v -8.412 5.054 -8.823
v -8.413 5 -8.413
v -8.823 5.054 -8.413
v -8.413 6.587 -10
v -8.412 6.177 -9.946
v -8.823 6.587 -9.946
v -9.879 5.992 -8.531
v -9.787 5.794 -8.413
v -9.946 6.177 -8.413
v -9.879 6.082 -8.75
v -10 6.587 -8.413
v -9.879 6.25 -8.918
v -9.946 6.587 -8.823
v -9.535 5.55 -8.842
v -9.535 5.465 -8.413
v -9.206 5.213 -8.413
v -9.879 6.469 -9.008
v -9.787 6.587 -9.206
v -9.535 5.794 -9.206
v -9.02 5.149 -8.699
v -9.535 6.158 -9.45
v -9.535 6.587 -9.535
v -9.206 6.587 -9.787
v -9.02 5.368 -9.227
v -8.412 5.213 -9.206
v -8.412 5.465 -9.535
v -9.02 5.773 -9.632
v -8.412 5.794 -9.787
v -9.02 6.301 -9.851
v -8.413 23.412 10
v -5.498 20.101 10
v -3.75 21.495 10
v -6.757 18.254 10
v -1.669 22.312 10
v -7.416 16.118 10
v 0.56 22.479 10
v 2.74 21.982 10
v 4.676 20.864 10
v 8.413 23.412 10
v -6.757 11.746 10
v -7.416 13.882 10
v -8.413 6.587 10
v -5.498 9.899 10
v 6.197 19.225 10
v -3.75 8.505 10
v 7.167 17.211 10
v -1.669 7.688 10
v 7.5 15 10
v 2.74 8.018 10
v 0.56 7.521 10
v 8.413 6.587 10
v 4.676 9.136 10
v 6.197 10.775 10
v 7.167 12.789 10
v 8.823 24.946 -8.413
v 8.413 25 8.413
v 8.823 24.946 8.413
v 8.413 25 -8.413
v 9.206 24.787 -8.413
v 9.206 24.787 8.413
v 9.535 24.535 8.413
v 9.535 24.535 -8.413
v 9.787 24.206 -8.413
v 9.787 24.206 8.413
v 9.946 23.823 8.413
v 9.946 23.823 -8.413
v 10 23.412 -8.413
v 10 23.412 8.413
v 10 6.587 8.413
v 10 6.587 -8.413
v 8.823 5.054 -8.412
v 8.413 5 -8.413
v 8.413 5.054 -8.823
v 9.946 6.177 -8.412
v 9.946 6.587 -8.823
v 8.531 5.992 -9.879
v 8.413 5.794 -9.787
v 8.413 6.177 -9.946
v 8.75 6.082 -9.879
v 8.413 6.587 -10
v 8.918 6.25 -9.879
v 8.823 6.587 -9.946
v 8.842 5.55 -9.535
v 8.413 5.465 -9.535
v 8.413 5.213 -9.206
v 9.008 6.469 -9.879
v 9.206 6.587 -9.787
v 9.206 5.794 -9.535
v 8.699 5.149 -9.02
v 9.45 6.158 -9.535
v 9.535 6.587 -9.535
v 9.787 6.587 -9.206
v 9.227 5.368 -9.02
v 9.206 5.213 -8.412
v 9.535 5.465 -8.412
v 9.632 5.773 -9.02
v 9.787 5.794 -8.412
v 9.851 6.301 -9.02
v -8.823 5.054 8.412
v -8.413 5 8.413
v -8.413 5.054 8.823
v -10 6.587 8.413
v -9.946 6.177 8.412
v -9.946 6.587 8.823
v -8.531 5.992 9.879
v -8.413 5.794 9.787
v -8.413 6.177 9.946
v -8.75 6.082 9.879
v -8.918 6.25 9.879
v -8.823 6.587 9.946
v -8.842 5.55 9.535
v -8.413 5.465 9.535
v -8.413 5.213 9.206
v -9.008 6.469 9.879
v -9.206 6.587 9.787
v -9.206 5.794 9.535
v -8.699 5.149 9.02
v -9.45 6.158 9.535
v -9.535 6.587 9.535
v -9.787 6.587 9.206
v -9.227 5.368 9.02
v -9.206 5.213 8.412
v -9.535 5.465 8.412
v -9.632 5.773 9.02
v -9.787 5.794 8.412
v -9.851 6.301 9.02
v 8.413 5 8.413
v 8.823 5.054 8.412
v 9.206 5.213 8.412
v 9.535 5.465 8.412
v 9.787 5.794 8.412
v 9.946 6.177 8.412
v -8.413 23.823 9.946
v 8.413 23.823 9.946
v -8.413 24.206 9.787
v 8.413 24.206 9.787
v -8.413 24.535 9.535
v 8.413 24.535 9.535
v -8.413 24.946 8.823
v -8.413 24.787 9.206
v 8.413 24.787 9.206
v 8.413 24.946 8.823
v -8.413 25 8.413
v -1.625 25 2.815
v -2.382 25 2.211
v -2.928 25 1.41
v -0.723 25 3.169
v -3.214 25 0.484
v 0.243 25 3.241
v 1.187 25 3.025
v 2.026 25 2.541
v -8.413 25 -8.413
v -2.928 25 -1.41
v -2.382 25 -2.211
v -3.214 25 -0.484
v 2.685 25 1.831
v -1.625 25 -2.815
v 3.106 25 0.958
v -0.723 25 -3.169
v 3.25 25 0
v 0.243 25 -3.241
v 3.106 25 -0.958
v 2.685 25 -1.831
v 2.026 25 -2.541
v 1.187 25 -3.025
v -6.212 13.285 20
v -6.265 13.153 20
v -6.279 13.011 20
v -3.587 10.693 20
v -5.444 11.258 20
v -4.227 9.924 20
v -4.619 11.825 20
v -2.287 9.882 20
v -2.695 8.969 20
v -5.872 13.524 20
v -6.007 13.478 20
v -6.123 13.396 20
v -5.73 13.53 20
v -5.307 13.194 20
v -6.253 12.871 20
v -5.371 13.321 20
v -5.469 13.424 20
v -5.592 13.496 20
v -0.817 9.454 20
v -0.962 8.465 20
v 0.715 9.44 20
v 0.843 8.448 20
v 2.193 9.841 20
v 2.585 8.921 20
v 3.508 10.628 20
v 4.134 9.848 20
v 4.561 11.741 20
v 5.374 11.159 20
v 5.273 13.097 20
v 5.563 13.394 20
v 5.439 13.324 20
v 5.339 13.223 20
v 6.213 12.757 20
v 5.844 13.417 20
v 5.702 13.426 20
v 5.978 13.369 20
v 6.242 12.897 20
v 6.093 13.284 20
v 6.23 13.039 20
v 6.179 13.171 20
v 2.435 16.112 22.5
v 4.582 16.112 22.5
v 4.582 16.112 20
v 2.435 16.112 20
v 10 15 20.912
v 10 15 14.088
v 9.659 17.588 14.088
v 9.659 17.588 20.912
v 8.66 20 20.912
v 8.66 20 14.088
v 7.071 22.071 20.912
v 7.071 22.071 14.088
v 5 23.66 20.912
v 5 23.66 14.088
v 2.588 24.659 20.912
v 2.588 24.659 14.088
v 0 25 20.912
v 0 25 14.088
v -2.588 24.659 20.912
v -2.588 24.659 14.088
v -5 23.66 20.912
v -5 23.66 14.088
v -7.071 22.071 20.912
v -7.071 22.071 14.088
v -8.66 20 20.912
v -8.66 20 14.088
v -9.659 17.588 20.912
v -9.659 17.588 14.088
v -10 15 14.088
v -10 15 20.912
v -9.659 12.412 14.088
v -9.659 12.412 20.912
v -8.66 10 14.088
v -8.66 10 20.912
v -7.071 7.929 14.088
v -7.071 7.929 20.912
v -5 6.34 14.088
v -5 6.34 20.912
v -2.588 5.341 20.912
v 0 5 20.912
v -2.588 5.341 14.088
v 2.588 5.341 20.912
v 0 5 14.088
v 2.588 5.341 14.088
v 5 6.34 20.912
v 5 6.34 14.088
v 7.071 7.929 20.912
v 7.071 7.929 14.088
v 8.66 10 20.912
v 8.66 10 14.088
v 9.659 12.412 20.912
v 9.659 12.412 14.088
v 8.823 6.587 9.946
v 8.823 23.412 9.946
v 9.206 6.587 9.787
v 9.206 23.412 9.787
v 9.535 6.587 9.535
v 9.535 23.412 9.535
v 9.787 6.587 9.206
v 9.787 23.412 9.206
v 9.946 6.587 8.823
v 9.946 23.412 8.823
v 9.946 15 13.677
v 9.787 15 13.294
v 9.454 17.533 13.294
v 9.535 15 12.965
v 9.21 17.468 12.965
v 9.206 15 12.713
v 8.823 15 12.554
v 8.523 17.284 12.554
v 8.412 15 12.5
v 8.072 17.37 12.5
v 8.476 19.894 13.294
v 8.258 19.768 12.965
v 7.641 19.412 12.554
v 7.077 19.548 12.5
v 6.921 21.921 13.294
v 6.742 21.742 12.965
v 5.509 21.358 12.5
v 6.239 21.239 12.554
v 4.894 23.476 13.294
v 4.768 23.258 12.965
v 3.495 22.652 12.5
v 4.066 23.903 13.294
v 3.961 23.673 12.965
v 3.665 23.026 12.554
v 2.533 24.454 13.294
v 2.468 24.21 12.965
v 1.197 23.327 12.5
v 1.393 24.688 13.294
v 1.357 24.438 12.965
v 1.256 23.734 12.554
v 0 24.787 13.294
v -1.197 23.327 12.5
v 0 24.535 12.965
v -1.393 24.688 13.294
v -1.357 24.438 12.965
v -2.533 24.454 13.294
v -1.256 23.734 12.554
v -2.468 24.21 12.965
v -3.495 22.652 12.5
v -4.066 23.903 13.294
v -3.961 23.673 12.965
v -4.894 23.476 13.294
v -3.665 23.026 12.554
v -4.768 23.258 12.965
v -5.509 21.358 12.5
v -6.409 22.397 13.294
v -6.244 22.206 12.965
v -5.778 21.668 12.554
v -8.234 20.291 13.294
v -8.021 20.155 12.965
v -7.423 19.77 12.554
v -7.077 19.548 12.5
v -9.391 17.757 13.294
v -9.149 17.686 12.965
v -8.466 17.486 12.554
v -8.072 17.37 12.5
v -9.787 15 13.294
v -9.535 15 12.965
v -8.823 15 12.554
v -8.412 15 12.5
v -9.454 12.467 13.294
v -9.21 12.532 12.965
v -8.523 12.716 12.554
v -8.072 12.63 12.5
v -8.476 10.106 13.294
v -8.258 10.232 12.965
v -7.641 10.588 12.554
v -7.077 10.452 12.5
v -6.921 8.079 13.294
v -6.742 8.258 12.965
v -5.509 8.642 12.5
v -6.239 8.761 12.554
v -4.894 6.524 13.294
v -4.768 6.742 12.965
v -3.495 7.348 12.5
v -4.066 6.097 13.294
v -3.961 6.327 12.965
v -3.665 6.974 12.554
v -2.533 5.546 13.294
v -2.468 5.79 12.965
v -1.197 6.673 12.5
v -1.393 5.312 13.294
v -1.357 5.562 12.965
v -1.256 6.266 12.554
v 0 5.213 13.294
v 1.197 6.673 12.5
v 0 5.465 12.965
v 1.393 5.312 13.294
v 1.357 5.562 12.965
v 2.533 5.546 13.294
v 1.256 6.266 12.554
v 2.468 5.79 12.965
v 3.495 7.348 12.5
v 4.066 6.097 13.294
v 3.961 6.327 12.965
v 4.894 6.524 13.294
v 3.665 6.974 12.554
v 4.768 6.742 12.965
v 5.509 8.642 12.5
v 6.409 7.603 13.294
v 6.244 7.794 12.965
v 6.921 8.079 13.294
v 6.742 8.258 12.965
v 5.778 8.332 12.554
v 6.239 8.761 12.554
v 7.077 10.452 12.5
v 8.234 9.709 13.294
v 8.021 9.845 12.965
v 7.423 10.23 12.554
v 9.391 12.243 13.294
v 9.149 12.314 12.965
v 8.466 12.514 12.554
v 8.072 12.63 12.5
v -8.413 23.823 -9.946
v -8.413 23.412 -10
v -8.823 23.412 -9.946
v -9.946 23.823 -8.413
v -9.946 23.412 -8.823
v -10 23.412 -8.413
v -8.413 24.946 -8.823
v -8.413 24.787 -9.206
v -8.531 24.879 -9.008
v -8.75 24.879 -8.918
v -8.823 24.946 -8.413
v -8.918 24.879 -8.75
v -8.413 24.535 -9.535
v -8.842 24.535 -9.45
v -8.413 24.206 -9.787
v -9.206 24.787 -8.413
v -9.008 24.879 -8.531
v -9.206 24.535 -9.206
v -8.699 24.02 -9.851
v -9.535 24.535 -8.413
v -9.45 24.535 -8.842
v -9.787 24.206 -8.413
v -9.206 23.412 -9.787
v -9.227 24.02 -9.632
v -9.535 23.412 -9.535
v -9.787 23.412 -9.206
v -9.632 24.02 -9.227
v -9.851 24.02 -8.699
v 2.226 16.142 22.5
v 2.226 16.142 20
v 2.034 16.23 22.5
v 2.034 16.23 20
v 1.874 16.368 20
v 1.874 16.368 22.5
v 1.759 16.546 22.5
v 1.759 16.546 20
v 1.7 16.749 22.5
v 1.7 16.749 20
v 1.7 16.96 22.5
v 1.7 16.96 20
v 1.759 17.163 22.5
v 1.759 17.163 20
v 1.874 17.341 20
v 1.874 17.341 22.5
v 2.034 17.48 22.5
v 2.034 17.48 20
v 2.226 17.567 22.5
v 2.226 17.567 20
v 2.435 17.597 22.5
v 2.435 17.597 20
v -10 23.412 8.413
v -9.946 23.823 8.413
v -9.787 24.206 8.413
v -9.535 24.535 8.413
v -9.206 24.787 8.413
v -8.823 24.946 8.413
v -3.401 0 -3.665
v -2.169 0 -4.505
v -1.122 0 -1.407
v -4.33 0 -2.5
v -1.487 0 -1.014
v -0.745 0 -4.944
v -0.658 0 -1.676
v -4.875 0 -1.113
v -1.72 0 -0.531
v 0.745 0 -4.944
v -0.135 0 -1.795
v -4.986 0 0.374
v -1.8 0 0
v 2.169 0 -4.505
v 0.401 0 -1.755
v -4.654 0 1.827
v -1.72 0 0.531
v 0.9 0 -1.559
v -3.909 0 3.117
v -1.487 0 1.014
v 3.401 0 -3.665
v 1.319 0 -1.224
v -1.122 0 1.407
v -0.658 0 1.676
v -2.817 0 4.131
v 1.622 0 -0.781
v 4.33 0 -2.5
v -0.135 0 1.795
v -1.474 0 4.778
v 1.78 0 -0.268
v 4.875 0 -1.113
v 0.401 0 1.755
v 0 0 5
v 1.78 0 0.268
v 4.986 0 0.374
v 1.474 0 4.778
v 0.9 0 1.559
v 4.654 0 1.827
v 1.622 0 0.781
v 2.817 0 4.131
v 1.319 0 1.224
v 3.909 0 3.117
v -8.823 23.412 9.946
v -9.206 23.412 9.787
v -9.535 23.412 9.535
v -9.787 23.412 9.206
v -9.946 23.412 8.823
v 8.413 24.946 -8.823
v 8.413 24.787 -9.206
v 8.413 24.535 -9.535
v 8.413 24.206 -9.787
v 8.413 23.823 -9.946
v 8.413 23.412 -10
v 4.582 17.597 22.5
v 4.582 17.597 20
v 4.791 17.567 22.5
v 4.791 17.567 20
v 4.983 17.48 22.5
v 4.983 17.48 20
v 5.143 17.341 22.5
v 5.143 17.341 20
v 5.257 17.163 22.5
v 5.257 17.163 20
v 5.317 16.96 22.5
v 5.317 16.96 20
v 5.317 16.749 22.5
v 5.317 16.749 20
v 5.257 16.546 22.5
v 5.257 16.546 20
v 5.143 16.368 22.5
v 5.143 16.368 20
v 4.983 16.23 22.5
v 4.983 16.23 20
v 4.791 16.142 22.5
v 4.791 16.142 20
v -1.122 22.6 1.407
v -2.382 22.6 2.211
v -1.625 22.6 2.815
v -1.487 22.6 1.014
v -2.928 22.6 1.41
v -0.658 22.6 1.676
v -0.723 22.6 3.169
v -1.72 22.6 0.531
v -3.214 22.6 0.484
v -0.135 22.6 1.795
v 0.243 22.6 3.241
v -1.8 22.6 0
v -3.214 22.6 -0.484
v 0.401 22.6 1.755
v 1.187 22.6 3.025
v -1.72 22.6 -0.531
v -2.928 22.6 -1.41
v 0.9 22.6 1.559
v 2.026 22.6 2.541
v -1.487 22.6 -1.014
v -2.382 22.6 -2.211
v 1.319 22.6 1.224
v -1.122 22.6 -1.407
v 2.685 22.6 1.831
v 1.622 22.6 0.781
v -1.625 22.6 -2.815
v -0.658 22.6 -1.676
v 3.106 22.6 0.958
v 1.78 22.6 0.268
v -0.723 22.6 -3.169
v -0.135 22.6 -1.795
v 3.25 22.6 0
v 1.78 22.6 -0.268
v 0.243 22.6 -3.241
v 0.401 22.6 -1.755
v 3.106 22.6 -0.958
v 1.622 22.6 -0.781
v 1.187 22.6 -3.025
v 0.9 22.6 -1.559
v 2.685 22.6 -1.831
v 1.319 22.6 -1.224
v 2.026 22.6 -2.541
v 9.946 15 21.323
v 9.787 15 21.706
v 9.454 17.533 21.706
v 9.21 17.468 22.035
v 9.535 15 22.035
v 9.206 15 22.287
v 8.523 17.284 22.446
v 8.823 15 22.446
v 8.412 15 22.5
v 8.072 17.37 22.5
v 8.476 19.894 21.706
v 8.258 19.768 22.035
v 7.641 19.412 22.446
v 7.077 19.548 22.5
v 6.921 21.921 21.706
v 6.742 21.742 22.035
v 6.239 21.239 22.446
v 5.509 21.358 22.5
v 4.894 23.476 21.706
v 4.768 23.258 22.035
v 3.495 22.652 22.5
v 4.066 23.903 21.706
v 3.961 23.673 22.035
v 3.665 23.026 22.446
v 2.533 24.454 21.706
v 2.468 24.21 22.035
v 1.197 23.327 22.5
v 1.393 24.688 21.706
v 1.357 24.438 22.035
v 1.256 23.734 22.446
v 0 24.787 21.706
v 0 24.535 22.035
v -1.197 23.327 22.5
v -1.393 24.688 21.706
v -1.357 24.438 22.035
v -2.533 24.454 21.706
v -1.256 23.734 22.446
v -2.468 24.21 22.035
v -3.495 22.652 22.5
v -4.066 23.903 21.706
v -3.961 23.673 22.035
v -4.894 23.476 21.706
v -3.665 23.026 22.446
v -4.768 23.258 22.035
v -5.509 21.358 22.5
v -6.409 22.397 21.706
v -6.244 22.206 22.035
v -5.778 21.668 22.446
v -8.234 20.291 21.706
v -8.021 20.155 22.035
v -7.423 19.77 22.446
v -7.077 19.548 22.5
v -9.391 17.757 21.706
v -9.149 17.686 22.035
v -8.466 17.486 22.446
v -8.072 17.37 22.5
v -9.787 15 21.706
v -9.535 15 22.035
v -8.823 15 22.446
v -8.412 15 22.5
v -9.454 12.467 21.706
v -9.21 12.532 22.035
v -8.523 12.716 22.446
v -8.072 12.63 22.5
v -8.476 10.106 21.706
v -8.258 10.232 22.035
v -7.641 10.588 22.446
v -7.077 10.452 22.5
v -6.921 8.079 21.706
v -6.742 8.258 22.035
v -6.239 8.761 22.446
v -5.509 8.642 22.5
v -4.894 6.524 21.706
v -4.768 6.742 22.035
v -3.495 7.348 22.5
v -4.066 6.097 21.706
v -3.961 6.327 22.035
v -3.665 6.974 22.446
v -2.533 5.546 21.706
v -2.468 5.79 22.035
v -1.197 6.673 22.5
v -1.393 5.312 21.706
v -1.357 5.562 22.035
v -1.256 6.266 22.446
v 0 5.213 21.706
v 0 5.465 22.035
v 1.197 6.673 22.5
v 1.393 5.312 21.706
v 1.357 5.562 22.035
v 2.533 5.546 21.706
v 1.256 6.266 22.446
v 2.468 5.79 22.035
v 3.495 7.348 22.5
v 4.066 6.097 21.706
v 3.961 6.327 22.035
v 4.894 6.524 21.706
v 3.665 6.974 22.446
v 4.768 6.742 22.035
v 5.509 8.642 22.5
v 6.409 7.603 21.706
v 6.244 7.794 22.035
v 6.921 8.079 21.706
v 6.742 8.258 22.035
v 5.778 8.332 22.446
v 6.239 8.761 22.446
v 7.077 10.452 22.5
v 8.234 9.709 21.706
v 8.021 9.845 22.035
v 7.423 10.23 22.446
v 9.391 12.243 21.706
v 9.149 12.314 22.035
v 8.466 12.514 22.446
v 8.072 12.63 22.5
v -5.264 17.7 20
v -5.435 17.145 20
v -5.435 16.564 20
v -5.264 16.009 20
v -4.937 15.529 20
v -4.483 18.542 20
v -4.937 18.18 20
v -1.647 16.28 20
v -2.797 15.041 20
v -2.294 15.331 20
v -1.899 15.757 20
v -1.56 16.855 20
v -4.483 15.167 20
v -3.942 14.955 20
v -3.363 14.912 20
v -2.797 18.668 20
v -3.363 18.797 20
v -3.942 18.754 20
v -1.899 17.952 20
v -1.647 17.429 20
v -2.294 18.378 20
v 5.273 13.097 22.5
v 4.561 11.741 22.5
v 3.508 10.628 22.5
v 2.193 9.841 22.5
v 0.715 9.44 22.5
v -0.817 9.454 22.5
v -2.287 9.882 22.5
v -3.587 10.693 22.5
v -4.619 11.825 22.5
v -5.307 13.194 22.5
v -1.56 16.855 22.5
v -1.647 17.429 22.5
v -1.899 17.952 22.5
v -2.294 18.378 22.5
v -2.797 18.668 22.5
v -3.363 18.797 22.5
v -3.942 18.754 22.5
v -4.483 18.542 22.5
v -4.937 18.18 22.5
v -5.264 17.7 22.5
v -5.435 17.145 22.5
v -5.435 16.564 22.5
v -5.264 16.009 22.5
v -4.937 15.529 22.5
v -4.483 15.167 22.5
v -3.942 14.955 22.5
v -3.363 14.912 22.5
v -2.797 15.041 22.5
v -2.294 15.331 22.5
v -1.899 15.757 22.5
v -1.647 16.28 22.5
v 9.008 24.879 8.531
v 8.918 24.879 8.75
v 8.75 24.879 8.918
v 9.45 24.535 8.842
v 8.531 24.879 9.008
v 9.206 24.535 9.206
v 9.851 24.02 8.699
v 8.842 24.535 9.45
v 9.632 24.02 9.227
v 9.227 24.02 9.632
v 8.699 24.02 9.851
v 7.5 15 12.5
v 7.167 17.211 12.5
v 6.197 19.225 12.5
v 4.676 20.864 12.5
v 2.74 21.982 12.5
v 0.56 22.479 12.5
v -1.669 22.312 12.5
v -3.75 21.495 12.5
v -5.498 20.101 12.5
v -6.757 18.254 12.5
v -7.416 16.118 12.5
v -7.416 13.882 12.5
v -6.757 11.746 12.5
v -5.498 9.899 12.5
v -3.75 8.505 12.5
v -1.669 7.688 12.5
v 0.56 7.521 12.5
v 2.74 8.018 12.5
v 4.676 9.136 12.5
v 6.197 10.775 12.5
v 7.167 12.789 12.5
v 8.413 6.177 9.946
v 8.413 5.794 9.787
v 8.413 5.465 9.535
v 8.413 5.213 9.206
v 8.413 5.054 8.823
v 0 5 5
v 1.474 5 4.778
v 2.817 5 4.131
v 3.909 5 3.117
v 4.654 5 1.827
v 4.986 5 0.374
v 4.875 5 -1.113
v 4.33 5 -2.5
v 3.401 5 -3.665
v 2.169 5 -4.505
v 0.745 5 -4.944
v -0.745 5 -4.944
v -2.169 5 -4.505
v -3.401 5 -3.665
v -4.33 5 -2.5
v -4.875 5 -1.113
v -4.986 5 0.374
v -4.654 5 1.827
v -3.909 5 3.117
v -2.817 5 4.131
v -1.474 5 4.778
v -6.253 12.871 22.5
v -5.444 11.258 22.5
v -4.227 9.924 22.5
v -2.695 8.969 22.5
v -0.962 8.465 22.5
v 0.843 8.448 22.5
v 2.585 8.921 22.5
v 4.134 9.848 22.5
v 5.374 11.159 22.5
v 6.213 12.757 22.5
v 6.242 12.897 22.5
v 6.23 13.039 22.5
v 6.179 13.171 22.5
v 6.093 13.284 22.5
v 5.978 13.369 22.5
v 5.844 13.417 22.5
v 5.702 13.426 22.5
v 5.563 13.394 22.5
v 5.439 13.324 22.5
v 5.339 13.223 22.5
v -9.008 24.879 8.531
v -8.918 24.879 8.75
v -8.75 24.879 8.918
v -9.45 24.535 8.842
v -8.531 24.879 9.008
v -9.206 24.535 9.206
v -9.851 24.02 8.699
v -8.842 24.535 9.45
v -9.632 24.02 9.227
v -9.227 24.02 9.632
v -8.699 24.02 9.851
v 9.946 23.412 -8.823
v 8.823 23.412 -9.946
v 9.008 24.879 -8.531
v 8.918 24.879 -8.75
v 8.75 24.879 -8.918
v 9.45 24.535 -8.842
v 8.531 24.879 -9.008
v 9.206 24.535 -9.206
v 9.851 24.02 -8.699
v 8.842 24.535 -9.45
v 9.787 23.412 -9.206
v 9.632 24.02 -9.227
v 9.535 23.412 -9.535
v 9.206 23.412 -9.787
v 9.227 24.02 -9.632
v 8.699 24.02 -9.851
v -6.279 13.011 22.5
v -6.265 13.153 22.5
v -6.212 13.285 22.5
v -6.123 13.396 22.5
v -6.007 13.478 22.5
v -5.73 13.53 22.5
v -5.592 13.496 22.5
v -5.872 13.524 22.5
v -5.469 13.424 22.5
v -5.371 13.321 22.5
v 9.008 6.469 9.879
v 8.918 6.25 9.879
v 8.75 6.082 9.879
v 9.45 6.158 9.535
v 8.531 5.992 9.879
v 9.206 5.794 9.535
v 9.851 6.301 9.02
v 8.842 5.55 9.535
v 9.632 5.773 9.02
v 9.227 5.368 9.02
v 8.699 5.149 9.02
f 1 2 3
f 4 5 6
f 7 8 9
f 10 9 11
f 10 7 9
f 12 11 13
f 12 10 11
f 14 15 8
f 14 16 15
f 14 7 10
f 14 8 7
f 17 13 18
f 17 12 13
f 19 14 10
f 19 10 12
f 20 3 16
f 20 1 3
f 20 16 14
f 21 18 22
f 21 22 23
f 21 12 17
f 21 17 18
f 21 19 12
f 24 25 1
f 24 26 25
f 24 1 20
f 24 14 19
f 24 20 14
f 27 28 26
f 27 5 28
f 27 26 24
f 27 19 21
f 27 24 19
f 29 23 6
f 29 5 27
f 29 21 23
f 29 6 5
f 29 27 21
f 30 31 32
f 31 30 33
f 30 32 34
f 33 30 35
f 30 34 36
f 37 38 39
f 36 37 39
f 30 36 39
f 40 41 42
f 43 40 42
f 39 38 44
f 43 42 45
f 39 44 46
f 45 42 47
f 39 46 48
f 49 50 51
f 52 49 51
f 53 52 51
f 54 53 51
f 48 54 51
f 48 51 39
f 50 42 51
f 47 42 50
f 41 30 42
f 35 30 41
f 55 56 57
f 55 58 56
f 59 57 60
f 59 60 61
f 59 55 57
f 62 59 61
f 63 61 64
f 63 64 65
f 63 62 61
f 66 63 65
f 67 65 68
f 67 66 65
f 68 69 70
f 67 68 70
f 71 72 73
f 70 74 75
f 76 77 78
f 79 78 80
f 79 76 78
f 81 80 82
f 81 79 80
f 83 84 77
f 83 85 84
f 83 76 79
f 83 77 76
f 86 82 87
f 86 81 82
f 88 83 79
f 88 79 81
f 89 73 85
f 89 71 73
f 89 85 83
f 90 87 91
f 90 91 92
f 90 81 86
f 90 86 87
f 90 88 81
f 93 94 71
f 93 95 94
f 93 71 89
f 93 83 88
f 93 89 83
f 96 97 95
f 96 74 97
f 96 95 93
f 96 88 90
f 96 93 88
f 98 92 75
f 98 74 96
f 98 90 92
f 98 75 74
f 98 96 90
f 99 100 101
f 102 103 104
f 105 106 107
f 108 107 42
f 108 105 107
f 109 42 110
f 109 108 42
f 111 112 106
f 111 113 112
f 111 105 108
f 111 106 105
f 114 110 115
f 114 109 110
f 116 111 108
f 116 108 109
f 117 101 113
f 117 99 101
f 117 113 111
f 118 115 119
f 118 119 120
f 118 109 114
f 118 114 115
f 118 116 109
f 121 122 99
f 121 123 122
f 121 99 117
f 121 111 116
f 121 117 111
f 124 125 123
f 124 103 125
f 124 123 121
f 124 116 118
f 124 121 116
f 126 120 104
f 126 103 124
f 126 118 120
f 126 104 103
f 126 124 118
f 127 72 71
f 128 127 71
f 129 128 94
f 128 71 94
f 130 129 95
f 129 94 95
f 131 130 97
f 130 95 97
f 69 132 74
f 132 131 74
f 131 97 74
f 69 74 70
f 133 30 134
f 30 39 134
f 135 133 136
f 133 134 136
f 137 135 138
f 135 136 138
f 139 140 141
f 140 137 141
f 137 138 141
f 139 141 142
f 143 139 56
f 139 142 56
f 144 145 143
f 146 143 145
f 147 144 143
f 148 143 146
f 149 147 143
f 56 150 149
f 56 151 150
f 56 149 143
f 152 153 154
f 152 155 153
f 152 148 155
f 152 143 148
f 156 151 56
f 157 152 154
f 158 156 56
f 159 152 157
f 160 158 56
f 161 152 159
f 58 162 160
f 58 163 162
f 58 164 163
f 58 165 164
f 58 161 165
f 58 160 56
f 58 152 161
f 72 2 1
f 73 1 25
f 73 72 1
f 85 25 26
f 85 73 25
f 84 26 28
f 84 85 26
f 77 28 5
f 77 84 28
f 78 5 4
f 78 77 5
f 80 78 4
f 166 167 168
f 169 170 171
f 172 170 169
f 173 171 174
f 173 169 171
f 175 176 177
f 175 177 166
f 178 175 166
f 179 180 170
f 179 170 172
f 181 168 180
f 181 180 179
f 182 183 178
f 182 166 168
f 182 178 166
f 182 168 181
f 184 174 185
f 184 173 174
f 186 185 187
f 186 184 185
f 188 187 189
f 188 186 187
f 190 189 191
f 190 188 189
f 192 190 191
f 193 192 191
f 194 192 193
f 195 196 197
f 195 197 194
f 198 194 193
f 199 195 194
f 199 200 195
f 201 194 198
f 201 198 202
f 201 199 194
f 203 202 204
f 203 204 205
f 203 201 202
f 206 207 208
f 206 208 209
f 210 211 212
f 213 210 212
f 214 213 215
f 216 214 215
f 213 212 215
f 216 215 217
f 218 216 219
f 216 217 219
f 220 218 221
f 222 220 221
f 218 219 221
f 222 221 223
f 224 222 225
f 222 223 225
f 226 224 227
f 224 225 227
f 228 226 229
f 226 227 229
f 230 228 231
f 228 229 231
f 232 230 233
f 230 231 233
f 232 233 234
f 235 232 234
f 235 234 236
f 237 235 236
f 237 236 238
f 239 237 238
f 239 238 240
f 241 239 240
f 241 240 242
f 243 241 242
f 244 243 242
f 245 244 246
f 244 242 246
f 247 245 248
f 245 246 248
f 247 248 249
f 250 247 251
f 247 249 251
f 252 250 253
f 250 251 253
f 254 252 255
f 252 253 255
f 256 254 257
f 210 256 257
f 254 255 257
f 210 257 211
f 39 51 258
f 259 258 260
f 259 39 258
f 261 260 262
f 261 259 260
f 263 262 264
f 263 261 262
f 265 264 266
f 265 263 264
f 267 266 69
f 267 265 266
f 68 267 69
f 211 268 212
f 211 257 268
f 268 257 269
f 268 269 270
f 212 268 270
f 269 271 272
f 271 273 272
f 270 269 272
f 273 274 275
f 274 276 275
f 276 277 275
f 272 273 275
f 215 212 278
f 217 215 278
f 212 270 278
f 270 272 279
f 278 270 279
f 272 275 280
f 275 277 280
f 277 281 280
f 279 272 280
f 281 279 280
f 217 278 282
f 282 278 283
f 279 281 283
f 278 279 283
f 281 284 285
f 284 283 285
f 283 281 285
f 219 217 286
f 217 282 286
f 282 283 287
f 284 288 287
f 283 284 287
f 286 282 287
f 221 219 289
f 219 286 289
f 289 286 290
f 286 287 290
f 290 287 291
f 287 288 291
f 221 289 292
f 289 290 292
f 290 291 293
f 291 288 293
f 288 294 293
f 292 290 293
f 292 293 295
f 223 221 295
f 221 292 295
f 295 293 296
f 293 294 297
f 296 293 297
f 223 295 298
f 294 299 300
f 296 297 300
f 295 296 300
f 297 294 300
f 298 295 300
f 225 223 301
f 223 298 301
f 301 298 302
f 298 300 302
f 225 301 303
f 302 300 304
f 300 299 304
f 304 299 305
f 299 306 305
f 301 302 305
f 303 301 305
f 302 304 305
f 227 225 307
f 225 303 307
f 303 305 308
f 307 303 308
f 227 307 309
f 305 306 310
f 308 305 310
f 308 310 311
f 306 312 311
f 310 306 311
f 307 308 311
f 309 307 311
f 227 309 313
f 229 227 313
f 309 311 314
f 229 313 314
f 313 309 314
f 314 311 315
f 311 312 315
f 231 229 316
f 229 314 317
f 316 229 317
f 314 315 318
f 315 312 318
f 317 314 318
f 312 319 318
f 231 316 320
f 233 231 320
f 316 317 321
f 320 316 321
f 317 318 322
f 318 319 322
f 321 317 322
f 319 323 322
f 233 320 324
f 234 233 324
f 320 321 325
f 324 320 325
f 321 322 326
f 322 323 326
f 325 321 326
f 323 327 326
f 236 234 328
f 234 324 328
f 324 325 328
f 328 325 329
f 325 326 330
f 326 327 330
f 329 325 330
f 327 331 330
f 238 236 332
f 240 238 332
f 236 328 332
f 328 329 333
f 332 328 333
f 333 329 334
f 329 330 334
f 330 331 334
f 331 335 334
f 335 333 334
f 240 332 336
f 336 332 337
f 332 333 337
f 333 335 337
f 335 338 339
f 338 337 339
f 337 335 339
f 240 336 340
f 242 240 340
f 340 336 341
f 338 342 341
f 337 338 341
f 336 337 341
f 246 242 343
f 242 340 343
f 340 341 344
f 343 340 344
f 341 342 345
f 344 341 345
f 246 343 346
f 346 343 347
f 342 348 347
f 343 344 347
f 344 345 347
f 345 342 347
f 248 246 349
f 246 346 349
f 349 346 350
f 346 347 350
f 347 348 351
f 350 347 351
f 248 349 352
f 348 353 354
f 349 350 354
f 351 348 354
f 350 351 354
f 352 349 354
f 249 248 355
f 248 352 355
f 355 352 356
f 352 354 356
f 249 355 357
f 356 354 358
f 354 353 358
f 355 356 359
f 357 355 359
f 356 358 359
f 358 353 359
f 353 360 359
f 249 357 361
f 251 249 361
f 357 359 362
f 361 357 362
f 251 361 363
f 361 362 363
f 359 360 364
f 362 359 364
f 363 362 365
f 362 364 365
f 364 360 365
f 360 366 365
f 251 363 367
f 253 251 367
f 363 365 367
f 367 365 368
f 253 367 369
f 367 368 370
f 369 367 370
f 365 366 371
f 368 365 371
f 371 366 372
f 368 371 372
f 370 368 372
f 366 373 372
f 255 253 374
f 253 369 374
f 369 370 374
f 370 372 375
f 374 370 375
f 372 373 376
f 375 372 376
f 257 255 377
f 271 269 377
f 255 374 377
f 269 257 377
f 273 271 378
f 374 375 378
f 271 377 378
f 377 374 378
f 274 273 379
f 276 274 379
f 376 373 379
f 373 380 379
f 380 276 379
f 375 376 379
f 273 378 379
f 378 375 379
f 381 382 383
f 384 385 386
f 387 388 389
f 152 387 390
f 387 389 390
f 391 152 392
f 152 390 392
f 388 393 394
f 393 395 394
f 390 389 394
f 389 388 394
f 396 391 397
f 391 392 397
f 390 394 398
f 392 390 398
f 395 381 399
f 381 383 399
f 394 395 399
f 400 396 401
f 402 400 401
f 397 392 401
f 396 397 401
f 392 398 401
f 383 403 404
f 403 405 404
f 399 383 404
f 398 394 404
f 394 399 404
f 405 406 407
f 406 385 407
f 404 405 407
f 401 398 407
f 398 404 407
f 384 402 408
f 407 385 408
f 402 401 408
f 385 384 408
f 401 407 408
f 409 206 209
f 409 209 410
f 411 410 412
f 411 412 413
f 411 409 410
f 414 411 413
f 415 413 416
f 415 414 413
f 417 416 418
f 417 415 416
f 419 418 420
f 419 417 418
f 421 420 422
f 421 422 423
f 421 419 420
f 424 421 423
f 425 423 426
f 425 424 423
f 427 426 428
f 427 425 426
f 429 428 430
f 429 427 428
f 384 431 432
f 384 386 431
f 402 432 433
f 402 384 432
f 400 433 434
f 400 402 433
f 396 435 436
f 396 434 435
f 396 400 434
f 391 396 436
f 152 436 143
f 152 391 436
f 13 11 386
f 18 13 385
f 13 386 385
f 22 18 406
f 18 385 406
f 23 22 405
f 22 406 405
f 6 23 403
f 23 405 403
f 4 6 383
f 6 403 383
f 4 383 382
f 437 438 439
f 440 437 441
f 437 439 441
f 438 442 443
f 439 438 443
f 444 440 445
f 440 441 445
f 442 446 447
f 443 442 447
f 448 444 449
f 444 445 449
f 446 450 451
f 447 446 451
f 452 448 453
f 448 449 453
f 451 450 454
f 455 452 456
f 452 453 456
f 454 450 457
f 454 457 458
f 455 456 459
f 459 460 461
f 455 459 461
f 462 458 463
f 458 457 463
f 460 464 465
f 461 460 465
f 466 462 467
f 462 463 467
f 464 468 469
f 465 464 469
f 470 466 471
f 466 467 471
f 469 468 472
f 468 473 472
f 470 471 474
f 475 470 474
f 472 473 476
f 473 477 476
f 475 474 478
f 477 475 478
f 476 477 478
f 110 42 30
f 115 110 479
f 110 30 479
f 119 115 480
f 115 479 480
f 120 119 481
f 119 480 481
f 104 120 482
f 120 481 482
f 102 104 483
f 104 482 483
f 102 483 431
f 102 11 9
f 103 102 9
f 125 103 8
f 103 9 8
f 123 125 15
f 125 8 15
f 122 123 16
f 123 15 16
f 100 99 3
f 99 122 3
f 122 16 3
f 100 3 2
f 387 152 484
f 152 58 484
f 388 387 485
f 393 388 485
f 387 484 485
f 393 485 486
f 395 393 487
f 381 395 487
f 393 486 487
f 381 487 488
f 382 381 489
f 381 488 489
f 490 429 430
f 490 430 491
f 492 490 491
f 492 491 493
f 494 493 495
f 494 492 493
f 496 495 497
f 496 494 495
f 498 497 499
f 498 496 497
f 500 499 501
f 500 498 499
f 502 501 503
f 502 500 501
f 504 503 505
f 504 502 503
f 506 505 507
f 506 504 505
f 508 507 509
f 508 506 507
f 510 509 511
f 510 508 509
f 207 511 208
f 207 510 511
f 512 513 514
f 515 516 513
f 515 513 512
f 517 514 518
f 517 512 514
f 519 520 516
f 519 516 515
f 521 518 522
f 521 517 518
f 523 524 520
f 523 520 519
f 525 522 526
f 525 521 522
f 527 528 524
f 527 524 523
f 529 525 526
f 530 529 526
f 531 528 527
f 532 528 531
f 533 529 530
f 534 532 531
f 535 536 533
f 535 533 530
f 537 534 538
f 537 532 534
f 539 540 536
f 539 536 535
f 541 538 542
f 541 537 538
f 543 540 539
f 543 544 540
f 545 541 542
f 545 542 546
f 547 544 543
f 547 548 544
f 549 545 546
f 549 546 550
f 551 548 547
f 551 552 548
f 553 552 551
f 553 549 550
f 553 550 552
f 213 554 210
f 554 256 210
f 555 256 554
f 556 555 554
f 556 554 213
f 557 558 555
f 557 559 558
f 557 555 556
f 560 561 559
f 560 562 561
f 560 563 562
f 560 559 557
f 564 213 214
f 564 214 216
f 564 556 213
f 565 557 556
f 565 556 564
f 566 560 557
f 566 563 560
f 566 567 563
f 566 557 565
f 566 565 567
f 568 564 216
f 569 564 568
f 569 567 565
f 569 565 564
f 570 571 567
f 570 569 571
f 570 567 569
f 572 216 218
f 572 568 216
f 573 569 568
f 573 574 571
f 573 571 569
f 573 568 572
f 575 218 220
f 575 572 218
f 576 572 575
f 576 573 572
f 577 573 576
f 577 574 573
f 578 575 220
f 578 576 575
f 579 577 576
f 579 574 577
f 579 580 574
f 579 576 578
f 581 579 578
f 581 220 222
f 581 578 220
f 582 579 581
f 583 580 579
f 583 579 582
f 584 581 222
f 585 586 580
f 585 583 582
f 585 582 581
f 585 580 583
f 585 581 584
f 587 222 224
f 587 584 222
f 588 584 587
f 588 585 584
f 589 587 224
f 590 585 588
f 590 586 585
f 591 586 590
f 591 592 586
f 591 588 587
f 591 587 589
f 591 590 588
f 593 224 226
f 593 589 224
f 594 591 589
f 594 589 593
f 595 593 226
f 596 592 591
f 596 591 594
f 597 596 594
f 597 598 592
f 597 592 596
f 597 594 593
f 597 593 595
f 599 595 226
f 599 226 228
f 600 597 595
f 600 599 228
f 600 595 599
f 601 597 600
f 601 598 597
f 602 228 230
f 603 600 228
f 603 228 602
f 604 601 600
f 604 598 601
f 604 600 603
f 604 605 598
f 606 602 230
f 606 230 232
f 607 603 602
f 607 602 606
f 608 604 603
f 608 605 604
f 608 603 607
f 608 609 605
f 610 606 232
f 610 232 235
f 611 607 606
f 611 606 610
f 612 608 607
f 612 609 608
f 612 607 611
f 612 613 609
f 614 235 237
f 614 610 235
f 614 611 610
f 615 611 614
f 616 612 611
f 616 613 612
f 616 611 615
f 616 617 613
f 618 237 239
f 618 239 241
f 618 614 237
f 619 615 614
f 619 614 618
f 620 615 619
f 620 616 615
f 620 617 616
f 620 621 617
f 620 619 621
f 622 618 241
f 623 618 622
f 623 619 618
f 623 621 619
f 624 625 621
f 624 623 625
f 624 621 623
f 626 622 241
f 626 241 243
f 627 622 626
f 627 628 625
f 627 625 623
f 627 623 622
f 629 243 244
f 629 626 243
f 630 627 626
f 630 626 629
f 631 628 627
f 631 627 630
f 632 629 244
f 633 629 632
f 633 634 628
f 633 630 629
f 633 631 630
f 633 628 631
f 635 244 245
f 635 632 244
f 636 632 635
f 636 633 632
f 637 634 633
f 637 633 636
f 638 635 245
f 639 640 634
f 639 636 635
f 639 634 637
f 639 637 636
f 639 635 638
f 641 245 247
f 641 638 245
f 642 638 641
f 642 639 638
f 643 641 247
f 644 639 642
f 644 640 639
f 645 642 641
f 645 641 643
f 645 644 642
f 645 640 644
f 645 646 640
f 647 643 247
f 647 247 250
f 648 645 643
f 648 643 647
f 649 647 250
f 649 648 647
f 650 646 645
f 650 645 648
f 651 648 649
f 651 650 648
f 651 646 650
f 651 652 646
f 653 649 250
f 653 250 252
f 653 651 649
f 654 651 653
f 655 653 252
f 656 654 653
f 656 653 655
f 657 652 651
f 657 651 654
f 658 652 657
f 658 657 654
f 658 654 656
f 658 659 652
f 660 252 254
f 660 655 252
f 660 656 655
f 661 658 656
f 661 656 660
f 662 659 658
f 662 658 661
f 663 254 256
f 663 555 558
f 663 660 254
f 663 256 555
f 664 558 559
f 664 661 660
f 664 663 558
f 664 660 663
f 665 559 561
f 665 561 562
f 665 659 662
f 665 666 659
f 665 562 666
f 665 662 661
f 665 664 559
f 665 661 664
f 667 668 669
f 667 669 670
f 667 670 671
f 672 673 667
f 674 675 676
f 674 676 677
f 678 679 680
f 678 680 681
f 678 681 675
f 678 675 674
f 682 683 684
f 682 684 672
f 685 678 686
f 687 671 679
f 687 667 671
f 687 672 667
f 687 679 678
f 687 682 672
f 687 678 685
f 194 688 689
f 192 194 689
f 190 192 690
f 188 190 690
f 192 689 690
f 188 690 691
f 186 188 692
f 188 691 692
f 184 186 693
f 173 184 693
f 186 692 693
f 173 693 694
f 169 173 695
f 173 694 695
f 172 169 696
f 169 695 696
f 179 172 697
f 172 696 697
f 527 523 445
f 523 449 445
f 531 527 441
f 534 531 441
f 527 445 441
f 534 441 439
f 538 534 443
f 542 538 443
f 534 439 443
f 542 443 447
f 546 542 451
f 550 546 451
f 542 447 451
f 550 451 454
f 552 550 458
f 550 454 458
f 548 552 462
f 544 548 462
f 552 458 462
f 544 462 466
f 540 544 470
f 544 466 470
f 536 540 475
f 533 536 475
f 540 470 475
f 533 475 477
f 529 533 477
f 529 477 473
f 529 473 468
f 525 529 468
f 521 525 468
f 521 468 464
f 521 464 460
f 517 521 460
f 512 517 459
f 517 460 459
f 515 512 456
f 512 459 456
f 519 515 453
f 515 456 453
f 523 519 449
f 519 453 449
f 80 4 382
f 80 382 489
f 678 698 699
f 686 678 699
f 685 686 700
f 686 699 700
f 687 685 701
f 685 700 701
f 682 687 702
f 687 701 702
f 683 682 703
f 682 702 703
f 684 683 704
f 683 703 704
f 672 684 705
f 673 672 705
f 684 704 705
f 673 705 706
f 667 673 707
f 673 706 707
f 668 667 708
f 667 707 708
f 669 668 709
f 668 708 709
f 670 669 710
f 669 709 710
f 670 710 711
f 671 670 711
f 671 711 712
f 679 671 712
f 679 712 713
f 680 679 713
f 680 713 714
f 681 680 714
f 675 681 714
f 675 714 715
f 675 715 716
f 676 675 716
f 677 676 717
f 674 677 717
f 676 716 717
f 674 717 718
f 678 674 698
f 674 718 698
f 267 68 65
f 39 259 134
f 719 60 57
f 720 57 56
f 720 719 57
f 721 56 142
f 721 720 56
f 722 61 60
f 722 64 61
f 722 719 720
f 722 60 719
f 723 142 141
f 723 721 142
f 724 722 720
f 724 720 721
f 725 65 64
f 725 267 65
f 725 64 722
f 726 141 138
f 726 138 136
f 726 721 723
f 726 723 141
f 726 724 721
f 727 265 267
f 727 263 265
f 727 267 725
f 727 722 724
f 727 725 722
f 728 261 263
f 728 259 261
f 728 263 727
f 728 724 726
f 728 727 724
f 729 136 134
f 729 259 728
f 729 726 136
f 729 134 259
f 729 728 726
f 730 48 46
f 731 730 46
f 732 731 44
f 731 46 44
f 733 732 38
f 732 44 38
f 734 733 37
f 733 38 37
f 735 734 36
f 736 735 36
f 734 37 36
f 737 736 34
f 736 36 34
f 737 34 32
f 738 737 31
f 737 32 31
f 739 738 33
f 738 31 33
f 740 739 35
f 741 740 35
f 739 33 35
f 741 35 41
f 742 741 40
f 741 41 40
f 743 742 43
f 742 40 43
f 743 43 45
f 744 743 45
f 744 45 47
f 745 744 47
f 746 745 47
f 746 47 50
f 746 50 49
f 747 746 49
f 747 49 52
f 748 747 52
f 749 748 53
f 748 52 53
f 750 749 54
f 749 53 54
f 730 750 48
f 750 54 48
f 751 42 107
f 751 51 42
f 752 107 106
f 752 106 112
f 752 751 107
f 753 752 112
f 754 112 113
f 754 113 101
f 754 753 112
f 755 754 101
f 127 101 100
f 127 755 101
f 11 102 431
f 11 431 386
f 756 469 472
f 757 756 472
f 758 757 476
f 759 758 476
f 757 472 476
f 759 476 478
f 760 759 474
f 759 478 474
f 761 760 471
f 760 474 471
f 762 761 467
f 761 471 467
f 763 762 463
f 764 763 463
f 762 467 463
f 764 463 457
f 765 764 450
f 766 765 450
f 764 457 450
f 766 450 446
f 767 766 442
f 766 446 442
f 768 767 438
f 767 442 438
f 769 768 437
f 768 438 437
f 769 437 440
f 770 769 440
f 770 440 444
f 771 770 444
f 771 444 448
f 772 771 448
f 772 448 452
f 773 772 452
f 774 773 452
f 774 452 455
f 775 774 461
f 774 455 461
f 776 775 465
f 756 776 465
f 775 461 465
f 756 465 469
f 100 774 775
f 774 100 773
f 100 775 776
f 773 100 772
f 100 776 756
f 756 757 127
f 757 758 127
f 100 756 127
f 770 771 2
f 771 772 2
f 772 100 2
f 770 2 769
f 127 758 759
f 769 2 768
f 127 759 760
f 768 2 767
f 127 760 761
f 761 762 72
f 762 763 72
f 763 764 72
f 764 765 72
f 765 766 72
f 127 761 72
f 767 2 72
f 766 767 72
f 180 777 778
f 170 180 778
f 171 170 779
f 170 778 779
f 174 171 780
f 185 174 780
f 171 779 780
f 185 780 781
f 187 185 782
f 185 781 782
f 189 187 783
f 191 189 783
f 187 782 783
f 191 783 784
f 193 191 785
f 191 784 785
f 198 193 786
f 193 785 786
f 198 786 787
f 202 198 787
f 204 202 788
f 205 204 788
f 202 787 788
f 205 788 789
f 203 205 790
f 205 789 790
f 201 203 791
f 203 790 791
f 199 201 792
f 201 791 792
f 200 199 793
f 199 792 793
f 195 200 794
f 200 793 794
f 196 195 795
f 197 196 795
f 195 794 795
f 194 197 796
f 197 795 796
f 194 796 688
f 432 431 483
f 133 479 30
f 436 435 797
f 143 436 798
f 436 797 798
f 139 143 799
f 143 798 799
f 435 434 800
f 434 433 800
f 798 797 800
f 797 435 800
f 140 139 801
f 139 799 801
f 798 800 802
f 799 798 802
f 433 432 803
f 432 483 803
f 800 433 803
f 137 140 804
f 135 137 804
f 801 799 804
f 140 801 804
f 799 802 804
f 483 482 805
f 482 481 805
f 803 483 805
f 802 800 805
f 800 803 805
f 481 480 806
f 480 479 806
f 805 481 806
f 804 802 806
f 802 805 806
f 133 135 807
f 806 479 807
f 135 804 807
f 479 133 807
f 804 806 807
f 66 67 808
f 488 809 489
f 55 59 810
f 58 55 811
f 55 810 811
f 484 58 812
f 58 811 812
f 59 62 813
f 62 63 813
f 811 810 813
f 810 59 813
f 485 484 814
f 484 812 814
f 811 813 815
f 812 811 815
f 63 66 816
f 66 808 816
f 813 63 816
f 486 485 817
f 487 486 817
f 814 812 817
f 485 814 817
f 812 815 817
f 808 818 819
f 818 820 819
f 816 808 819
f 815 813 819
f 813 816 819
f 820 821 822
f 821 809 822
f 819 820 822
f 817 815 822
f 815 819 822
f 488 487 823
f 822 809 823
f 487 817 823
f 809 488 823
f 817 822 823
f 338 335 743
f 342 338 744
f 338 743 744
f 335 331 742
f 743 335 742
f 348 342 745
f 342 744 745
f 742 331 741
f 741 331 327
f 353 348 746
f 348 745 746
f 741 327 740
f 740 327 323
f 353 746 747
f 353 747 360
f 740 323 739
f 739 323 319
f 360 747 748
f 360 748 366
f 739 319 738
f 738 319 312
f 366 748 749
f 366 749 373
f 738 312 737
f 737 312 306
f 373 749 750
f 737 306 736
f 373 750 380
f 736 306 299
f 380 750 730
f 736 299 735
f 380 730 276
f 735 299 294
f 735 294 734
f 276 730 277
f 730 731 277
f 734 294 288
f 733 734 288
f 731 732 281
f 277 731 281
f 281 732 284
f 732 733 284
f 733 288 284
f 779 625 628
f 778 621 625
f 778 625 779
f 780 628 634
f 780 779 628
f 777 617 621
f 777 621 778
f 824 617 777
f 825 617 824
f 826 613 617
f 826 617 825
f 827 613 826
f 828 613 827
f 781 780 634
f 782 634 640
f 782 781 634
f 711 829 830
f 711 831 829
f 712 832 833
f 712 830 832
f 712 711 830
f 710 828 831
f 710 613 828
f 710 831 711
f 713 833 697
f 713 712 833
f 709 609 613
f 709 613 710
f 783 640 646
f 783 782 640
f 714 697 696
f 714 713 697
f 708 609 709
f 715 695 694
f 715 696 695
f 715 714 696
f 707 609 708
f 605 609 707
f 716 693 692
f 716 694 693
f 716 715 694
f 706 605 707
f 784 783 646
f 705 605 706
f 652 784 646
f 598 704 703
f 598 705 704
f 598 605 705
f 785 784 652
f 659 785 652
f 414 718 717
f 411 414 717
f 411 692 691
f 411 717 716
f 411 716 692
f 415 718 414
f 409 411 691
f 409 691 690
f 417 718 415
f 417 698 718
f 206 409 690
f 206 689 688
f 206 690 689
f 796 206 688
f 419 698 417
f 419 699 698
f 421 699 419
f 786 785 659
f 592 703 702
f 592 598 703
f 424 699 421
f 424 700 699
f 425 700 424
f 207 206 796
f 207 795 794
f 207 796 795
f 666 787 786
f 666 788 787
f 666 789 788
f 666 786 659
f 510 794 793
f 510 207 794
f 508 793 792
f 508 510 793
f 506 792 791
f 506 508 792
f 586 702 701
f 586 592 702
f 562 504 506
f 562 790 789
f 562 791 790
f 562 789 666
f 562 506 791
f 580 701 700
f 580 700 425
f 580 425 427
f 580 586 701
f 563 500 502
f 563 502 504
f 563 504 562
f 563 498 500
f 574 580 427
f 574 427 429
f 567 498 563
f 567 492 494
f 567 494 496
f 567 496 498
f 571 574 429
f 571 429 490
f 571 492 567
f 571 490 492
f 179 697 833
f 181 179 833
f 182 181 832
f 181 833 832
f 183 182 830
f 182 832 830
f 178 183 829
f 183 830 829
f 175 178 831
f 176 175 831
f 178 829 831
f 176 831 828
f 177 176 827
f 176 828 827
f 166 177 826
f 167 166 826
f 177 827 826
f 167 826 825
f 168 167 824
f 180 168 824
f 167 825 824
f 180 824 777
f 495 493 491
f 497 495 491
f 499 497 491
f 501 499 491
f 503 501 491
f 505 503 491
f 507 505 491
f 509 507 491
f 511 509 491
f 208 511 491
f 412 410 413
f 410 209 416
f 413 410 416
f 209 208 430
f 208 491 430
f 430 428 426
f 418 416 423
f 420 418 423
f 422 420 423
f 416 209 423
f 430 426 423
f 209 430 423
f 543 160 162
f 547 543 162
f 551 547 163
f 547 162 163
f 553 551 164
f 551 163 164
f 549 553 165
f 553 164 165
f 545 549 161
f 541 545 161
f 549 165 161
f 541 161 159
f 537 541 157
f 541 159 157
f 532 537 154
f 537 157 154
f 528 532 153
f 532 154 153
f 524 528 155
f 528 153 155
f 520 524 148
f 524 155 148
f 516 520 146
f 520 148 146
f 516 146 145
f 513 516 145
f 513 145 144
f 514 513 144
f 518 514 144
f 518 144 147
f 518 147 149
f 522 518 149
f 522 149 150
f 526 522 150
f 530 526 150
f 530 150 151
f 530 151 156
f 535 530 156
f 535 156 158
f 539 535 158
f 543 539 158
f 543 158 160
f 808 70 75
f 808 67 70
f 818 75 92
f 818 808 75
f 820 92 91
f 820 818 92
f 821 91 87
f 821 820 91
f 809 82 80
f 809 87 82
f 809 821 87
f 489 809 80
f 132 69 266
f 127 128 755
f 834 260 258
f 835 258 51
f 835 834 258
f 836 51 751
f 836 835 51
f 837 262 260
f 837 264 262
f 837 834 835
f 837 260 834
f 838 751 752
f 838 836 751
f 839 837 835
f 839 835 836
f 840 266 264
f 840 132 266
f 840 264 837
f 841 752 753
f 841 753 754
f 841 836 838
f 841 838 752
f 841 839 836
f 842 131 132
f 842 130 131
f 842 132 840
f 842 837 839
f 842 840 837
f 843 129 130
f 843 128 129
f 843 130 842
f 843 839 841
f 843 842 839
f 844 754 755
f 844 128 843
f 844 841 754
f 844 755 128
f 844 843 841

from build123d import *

# Parameters (mm, degrees)
SKETCH1_R                                            = 5
BOSS_EXTRUDE1_DEPTH                                  = 5
SKETCH2_W                                            = 20
SKETCH2_H                                            = 20
BOSS_EXTRUDE2_DEPTH                                  = 20
SKETCH3_R                                            = 7.5
BOSS_EXTRUDE4_DEPTH                                  = 2.5
SKETCH4_R                                            = 10
BOSS_EXTRUDE5_DEPTH                                  = 10
CBORE_FOR_M3_HEX_SOCKET_THIN_HEAD_CAP_SC_D           = 3.6
CBORE_FOR_M3_HEX_SOCKET_THIN_HEAD_CAP_SC_CBORE_D     = 6.5
CBORE_FOR_M3_HEX_SOCKET_THIN_HEAD_CAP_SC_CBORE_DEPTH = 2.4
FILLET1_R                                            = 1.5875
SKETCH7_R                                            = 1.948257307
CUT_EXTRUDE2_DEPTH                                   = 2.5


with BuildPart() as part:
    # Sketch1 → Boss-Extrude1 (new body)
    with BuildSketch(Plane(origin=(0, 0, 0), x_dir=(1, 0, 0), z_dir=(0, 1, 0))):
        with Locations(Location((0, 0, 0), (0, 0, 270))):
            Circle(SKETCH1_R)
    extrude(amount=BOSS_EXTRUDE1_DEPTH)

    # Sketch2 → Boss-Extrude2 (add)
    with BuildSketch(Plane(origin=(0, 5, 0), x_dir=(1, 0, 0), z_dir=(0, 1, 0))):
        Rectangle(SKETCH2_W, SKETCH2_H)
    extrude(amount=BOSS_EXTRUDE2_DEPTH)

    # Sketch3 → Boss-Extrude4 (add)
    with BuildSketch(Plane.XY.offset(10)):
        with Locations((0, 15)):
            Circle(SKETCH3_R)
    extrude(amount=BOSS_EXTRUDE4_DEPTH)

    # Sketch4 → Boss-Extrude5 (add)
    with BuildSketch(Plane.XY.offset(12.5)):
        with Locations((0, 15)):
            Circle(SKETCH4_R)
    extrude(amount=BOSS_EXTRUDE5_DEPTH)

    # CBORE for M3 Hex Socket Thin Head Cap Screw1 (through all)
    with Locations(Plane(origin=(0, 25, 0), x_dir=(1, 0, 0), z_dir=(0, 1, 0))):
        with Locations((0, 0)):
            CounterBoreHole(CBORE_FOR_M3_HEX_SOCKET_THIN_HEAD_CAP_SC_D / 2, CBORE_FOR_M3_HEX_SOCKET_THIN_HEAD_CAP_SC_CBORE_D / 2, CBORE_FOR_M3_HEX_SOCKET_THIN_HEAD_CAP_SC_CBORE_DEPTH)

    # Fillet1
    fillet1_edges = [part.edges().sort_by_distance(p)[0] for p in [
        (-10, 15, 12.5),
        (-10, 15, 22.5),
        (10, 5, 0),
        (10, 15, 10),
        (0, 5, -10),
        (10, 15, -10),
        (-10, 5, 0),
        (-10, 15, -10),
        (0, 5, 10),
        (-10, 15, 10),
        (10, 25, 0),
        (0, 25, -10),
        (-10, 25, 0),
        (0, 25, 10),
    ]]
    fillet(fillet1_edges, radius=FILLET1_R)

    # Sketch7 → Cut-Extrude2 (cut)
    with BuildSketch(Plane.XY.offset(22.5)):
        with Locations((-3.508388237, 16.85452893)):
            Circle(SKETCH7_R)
        with BuildLine():
            Line((2.435234188, 17.597481733), (4.581542286, 17.597481733))
            ThreePointArc((4.581542286, 17.597481733), (5.32449509, 16.85452893), (4.581542286, 16.111576127))
            Line((4.581542286, 16.111576127), (2.435234188, 16.111576127))
            ThreePointArc((2.435234188, 16.111576127), (1.692281385, 16.85452893), (2.435234188, 17.597481733))
        make_face()
        with BuildLine():
            ThreePointArc((-6.253186094, 12.871476402), (-0.060422297, 8.394752224), (6.213201069, 12.757438628))
            ThreePointArc((6.213201069, 12.757438628), (5.912646592, 13.397490974), (5.272594245, 13.096936498))
            ThreePointArc((5.272594245, 13.096936498), (-0.05127506, 9.394710388), (-5.306526, 13.193710271))
            ThreePointArc((-5.306526, 13.193710271), (-5.940972981, 13.505923383), (-6.253186094, 12.871476402))
        make_face()
    extrude(amount=-CUT_EXTRUDE2_DEPTH, mode=Mode.SUBTRACT)


solid = part.part
